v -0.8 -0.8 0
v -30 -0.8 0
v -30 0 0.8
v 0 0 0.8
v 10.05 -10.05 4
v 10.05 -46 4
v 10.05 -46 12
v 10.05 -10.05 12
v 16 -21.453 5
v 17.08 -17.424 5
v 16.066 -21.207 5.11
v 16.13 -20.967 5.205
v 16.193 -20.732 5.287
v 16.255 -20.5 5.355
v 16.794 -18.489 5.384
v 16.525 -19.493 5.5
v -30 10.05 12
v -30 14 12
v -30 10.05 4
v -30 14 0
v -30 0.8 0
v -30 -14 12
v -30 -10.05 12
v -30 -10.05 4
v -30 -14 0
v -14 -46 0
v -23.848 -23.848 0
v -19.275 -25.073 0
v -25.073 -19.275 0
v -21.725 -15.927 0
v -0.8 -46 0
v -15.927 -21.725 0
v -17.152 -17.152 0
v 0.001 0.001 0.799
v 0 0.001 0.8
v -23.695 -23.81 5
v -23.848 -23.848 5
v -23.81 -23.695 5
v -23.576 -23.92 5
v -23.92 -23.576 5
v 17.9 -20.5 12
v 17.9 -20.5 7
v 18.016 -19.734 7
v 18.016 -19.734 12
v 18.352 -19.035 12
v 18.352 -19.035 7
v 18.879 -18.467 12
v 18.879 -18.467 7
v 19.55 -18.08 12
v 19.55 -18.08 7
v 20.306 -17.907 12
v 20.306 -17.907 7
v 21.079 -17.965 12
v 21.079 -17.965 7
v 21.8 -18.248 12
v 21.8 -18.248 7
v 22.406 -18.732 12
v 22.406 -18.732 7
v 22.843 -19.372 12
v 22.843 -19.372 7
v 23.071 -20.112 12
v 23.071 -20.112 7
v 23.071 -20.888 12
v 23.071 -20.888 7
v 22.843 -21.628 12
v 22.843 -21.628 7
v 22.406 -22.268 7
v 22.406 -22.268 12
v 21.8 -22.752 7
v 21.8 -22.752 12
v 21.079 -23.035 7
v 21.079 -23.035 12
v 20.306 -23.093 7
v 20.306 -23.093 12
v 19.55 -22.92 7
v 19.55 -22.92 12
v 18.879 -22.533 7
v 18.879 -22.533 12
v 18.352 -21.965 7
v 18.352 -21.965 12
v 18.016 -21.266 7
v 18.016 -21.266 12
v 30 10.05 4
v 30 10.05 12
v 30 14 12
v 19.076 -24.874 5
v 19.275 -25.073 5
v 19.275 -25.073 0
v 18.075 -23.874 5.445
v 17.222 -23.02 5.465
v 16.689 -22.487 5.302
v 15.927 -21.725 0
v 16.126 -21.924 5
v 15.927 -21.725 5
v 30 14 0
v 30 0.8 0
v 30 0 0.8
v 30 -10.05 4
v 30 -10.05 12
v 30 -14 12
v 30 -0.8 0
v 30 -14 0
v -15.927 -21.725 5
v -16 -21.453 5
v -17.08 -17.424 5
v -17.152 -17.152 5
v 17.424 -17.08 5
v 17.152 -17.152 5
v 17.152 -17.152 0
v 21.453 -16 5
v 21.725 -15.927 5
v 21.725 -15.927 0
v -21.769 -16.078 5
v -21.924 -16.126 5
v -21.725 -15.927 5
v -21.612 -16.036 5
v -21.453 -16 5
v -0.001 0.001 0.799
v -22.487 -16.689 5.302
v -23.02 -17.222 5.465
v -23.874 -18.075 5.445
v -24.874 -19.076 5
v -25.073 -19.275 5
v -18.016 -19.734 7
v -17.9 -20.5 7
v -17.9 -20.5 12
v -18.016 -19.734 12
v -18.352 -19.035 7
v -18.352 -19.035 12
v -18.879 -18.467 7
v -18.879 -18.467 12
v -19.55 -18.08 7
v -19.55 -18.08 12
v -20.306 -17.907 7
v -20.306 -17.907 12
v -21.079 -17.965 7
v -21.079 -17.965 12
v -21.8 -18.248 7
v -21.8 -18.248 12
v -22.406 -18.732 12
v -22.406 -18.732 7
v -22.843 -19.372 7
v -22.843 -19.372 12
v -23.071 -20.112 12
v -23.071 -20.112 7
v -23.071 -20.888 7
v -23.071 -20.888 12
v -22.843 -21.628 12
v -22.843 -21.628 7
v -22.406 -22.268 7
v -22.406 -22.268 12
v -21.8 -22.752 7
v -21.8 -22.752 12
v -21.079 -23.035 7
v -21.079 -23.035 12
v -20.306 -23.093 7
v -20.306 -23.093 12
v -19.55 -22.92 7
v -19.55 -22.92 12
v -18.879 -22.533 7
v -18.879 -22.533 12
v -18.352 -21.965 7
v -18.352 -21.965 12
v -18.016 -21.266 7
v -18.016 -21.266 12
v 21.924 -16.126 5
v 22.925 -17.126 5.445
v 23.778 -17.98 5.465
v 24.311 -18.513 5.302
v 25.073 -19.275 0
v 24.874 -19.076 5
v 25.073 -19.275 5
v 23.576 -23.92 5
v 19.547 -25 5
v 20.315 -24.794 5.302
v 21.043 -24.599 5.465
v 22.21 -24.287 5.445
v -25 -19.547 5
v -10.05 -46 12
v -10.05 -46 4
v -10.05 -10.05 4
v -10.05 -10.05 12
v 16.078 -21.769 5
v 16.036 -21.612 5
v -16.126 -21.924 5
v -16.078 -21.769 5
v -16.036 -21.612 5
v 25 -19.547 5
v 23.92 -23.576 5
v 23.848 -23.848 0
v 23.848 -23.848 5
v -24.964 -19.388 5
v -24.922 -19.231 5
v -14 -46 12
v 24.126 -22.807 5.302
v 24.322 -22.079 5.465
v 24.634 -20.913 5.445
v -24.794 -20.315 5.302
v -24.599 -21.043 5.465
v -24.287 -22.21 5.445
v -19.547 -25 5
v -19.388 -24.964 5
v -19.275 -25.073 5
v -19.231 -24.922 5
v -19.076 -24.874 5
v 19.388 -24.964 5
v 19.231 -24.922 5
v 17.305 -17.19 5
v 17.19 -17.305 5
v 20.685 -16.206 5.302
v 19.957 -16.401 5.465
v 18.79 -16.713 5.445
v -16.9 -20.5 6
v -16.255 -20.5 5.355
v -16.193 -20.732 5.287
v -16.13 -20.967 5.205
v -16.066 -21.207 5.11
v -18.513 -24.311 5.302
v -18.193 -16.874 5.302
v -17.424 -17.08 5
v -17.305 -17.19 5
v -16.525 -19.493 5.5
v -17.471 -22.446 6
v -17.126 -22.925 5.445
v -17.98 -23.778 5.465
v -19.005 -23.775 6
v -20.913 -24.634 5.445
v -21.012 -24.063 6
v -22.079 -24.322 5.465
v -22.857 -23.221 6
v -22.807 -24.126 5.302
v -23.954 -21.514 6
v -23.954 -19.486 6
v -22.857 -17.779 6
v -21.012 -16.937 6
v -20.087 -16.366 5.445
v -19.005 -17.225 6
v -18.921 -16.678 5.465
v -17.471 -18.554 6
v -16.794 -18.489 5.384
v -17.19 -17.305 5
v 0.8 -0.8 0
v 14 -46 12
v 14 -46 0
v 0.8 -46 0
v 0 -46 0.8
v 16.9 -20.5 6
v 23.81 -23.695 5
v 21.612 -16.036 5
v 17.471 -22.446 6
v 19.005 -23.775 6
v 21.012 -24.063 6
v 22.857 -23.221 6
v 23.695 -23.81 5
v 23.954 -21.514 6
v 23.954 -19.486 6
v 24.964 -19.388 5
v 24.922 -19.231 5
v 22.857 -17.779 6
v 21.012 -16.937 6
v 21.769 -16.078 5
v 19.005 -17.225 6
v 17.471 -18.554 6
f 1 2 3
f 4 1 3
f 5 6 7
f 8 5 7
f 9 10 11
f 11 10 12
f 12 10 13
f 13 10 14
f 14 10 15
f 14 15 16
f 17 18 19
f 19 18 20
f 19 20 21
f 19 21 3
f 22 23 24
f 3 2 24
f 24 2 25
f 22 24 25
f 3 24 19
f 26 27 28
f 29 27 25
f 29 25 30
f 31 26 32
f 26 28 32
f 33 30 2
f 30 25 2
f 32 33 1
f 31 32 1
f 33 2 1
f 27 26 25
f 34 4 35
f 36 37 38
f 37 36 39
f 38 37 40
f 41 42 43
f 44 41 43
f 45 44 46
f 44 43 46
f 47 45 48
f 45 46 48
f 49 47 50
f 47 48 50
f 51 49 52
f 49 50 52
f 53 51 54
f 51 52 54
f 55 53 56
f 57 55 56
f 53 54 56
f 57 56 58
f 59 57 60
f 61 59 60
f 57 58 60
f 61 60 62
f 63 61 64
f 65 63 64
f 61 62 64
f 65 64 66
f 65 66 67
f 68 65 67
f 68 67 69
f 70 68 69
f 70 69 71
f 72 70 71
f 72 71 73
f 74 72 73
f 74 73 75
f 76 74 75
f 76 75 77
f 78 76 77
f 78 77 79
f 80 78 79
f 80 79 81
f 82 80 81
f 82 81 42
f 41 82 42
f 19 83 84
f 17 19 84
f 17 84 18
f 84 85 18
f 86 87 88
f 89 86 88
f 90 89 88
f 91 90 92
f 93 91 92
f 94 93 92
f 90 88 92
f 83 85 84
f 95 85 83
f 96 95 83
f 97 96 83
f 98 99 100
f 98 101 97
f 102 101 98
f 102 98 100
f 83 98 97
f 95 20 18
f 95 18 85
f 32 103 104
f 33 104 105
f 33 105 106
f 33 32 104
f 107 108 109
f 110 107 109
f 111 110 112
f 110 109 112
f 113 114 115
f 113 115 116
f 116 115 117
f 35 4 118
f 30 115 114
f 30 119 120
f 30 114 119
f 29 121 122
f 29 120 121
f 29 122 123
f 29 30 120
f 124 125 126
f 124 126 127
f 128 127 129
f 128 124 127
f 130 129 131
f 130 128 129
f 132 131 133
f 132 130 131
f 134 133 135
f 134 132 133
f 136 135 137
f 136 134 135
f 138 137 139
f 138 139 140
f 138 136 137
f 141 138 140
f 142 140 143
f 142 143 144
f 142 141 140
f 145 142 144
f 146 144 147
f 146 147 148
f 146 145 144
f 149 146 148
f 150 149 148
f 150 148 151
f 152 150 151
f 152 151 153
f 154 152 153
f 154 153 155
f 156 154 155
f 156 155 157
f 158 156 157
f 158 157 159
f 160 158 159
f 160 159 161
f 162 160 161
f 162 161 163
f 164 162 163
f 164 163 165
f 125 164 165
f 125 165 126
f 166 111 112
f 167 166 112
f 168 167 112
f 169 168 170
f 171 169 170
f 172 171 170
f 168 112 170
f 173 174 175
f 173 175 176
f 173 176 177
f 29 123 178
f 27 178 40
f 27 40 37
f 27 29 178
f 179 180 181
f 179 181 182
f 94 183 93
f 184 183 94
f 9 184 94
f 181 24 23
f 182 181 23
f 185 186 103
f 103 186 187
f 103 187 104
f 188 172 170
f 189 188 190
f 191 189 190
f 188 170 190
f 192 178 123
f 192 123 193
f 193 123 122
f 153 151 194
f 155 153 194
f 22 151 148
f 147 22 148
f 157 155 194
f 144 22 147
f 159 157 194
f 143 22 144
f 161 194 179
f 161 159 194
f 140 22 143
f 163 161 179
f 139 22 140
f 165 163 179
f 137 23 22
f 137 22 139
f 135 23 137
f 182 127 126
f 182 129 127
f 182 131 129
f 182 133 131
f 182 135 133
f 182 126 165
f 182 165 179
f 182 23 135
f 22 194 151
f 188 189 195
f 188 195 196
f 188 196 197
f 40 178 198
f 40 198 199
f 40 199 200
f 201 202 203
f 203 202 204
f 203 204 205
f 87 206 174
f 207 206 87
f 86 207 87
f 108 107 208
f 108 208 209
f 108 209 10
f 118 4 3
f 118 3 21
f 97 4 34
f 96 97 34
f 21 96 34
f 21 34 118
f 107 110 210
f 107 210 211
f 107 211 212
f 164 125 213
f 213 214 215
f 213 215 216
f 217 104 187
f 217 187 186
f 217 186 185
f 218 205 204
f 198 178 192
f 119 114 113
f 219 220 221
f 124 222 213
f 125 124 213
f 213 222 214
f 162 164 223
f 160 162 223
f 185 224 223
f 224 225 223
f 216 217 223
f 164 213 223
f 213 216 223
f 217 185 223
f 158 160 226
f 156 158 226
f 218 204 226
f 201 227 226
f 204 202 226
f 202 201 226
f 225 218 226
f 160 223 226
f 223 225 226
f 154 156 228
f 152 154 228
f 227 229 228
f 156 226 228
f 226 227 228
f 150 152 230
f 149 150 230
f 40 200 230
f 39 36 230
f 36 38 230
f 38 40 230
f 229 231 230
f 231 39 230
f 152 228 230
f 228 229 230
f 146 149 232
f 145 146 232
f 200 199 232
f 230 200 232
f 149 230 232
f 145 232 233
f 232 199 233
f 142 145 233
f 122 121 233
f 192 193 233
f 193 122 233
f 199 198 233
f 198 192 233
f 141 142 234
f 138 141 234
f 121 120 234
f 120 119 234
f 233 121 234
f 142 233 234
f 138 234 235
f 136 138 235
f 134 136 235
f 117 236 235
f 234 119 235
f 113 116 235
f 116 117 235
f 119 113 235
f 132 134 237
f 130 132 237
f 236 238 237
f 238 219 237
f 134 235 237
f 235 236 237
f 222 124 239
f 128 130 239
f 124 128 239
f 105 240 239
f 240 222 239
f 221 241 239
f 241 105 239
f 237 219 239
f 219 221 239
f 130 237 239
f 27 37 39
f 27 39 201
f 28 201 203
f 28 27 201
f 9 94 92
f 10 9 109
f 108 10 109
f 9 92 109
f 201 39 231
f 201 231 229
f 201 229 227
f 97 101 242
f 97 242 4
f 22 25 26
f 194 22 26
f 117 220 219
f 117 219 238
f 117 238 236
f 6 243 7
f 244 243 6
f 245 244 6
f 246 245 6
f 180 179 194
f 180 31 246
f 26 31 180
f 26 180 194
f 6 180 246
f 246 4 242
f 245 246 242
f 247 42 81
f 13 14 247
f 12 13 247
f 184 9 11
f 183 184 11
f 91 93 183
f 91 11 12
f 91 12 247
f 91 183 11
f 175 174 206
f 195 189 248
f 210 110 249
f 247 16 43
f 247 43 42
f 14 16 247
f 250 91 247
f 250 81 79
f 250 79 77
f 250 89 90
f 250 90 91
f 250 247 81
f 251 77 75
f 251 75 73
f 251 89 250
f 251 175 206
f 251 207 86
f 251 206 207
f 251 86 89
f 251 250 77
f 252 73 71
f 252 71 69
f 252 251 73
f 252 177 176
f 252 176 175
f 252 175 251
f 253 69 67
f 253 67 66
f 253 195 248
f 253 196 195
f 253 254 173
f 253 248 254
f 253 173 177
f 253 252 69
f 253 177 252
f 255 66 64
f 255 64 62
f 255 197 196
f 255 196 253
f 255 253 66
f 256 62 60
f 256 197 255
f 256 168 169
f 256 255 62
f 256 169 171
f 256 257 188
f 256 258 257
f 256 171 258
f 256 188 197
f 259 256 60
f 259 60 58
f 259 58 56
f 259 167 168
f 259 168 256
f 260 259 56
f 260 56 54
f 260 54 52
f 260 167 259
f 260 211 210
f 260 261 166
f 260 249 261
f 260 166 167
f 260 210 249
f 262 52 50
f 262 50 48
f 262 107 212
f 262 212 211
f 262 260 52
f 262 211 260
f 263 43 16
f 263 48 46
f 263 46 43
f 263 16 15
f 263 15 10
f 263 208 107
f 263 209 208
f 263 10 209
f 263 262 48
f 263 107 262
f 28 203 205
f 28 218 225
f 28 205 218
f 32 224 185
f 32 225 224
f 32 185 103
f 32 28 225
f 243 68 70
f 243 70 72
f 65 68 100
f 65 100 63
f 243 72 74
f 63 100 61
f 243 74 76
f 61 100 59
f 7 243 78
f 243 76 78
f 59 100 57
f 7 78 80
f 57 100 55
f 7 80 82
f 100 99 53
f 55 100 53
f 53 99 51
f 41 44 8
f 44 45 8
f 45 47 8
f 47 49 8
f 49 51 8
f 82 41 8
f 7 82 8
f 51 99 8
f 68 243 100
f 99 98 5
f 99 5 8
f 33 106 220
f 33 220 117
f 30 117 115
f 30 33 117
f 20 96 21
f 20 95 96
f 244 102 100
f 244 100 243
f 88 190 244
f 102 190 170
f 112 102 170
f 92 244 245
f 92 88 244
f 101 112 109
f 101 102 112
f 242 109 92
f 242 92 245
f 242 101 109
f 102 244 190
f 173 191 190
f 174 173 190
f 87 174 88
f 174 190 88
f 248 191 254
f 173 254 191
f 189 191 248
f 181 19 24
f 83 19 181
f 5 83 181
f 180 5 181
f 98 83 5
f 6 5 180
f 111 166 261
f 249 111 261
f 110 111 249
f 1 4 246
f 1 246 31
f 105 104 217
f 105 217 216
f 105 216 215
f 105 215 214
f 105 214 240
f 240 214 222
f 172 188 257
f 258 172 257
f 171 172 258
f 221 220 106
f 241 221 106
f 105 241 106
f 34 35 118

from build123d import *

# Parameters (mm, degrees)
F0_R     = 2.6
F1_DEPTH = 12
F3_W     = 20.1
F3_H     = 8
F4_DEPTH = 30.001
F2_W     = 10.05
F2_H     = 8
F5_DEPTH = 46.001
F7_DEPTH = 5


# Not quite as in the source:
# - a fillet or chamfer that OpenCascade refuses, or shapes differently, is made with other operations: its cross-section is extruded or revolved along the edge and cut away or added


with BuildPart() as f1:
    # F0 (on Top) → F1 (new body)
    with BuildSketch(Plane.XY):
        Polygon((0, -46), (0, 14), (-30, 14), (-30, -14), (-14, -46), align=None)
        with Locations((-20.5, -20.5)):
            Circle(F0_R, mode=Mode.SUBTRACT)
    extrude(amount=F1_DEPTH)

    # F3 (on face) → F4 (cut, through all)
    with BuildSketch(Plane(origin=(-30, 0, 0), x_dir=(0, -1, 0), z_dir=(-1, 0, 0))):
        with Locations((0, 8)):
            Rectangle(F3_W, F3_H)
        Polygon((0, 0.8), (-0.8, 0), (0.8, 0), align=None)
    extrude(amount=-F4_DEPTH, mode=Mode.SUBTRACT)

    # F2 (on face) → F5 (cut, through all)
    with BuildSketch(Plane.XZ.offset(46)):
        with Locations((-5.025, 8)):
            Rectangle(F2_W, F2_H)
        Polygon((-0.8, 0), (0, 0), (0, 0.8), align=None)
    extrude(amount=-F5_DEPTH, mode=Mode.SUBTRACT)

    # F6 (on face) → F7 (cut)
    with BuildSketch(Plane.XY):
        Polygon((-15.9270442062, -21.725319812), (-17.1523640182, -17.1523640182), (-21.725319812, -15.9270442062), (-25.0729557938, -19.274680188), (-23.8476359818, -23.8476359818), (-19.274680188, -25.0729557938), align=None)
    extrude(amount=F7_DEPTH, mode=Mode.SUBTRACT)

    # F8: F1 across plane


with BuildPart() as f1_1:
    add(f1.part)
    add(f1.part.mirror(Plane.YZ))

    # F9: chamfer of 2 on 2 edges, made by hand


with BuildPart() as f9_tool2:
    # F9_s3 → F9_t4 (revolve)
    with BuildSketch(Plane.XZ.offset(20.5)):
        Polygon((17.9, 7), (15.9, 5), (17.9, 5), align=None)
    revolve(axis=Axis((20.5, -20.5, 5), (0, 0, 1)))

    split(bisect_by=Plane(origin=(20.291464501, -5.4370815263, 0), x_dir=(0, 0, 1), z_dir=(0.9659258263, -0.2588190451, 0)), keep=Keep.TOP)

    split(bisect_by=Plane(origin=(-2.8991378029, -2.8991378029, 0), x_dir=(0, 0, 1), z_dir=(0.7071067812, 0.7071067812, 0)), keep=Keep.TOP)

    split(bisect_by=Plane(origin=(5.4370815263, -20.291464501, 0), x_dir=(0, 0, 1), z_dir=(0.2588190451, -0.9659258263, 0)), keep=Keep.TOP)

    split(bisect_by=Plane(origin=(7.5593976961, -28.2120562766, 0), x_dir=(0, 0, 1), z_dir=(-0.2588190451, 0.9659258263, 0)), keep=Keep.TOP)

    split(bisect_by=Plane(origin=(2.8991378029, 2.8991378029, 0), x_dir=(0, 0, 1), z_dir=(-0.7071067812, -0.7071067812, 0)), keep=Keep.TOP)

    split(bisect_by=Plane(origin=(28.2120562766, -7.5593976961, 0), x_dir=(0, 0, 1), z_dir=(-0.9659258263, 0.2588190451, 0)), keep=Keep.TOP)


with BuildPart() as f1_2:
    add(f1_1.part)

    # F9_t1: cut F9_tool2
    add(f9_tool2.part, mode=Mode.SUBTRACT)


with BuildPart() as f9_tool12:
    # F9_s13 → F9_t14 (revolve)
    with BuildSketch(Plane.XZ.offset(20.5)):
        Polygon((-17.9, 7), (-15.9, 5), (-17.9, 5), align=None)
    revolve(axis=Axis((-20.5, -20.5, 5), (0, 0, -1)))

    split(bisect_by=Plane(origin=(-20.291464501, -5.4370815263, 0), x_dir=(0, 0, 1), z_dir=(-0.9659258263, -0.2588190451, 0)), keep=Keep.TOP)

    split(bisect_by=Plane(origin=(2.8991378029, -2.8991378029, 0), x_dir=(0, 0, 1), z_dir=(-0.7071067812, 0.7071067812, 0)), keep=Keep.TOP)

    split(bisect_by=Plane(origin=(-5.4370815263, -20.291464501, 0), x_dir=(0, 0, 1), z_dir=(-0.2588190451, -0.9659258263, 0)), keep=Keep.TOP)

    split(bisect_by=Plane(origin=(-7.5593976961, -28.2120562766, 0), x_dir=(0, 0, 1), z_dir=(0.2588190451, 0.9659258263, 0)), keep=Keep.TOP)

    split(bisect_by=Plane(origin=(-2.8991378029, 2.8991378029, 0), x_dir=(0, 0, 1), z_dir=(0.7071067812, -0.7071067812, 0)), keep=Keep.TOP)

    split(bisect_by=Plane(origin=(-28.2120562766, -7.5593976961, 0), x_dir=(0, 0, 1), z_dir=(0.9659258263, 0.2588190451, 0)), keep=Keep.TOP)


with BuildPart() as f1_3:
    add(f1_2.part)

    # F9_t11: cut F9_tool12
    add(f9_tool12.part, mode=Mode.SUBTRACT)


solid = f1_3.part
